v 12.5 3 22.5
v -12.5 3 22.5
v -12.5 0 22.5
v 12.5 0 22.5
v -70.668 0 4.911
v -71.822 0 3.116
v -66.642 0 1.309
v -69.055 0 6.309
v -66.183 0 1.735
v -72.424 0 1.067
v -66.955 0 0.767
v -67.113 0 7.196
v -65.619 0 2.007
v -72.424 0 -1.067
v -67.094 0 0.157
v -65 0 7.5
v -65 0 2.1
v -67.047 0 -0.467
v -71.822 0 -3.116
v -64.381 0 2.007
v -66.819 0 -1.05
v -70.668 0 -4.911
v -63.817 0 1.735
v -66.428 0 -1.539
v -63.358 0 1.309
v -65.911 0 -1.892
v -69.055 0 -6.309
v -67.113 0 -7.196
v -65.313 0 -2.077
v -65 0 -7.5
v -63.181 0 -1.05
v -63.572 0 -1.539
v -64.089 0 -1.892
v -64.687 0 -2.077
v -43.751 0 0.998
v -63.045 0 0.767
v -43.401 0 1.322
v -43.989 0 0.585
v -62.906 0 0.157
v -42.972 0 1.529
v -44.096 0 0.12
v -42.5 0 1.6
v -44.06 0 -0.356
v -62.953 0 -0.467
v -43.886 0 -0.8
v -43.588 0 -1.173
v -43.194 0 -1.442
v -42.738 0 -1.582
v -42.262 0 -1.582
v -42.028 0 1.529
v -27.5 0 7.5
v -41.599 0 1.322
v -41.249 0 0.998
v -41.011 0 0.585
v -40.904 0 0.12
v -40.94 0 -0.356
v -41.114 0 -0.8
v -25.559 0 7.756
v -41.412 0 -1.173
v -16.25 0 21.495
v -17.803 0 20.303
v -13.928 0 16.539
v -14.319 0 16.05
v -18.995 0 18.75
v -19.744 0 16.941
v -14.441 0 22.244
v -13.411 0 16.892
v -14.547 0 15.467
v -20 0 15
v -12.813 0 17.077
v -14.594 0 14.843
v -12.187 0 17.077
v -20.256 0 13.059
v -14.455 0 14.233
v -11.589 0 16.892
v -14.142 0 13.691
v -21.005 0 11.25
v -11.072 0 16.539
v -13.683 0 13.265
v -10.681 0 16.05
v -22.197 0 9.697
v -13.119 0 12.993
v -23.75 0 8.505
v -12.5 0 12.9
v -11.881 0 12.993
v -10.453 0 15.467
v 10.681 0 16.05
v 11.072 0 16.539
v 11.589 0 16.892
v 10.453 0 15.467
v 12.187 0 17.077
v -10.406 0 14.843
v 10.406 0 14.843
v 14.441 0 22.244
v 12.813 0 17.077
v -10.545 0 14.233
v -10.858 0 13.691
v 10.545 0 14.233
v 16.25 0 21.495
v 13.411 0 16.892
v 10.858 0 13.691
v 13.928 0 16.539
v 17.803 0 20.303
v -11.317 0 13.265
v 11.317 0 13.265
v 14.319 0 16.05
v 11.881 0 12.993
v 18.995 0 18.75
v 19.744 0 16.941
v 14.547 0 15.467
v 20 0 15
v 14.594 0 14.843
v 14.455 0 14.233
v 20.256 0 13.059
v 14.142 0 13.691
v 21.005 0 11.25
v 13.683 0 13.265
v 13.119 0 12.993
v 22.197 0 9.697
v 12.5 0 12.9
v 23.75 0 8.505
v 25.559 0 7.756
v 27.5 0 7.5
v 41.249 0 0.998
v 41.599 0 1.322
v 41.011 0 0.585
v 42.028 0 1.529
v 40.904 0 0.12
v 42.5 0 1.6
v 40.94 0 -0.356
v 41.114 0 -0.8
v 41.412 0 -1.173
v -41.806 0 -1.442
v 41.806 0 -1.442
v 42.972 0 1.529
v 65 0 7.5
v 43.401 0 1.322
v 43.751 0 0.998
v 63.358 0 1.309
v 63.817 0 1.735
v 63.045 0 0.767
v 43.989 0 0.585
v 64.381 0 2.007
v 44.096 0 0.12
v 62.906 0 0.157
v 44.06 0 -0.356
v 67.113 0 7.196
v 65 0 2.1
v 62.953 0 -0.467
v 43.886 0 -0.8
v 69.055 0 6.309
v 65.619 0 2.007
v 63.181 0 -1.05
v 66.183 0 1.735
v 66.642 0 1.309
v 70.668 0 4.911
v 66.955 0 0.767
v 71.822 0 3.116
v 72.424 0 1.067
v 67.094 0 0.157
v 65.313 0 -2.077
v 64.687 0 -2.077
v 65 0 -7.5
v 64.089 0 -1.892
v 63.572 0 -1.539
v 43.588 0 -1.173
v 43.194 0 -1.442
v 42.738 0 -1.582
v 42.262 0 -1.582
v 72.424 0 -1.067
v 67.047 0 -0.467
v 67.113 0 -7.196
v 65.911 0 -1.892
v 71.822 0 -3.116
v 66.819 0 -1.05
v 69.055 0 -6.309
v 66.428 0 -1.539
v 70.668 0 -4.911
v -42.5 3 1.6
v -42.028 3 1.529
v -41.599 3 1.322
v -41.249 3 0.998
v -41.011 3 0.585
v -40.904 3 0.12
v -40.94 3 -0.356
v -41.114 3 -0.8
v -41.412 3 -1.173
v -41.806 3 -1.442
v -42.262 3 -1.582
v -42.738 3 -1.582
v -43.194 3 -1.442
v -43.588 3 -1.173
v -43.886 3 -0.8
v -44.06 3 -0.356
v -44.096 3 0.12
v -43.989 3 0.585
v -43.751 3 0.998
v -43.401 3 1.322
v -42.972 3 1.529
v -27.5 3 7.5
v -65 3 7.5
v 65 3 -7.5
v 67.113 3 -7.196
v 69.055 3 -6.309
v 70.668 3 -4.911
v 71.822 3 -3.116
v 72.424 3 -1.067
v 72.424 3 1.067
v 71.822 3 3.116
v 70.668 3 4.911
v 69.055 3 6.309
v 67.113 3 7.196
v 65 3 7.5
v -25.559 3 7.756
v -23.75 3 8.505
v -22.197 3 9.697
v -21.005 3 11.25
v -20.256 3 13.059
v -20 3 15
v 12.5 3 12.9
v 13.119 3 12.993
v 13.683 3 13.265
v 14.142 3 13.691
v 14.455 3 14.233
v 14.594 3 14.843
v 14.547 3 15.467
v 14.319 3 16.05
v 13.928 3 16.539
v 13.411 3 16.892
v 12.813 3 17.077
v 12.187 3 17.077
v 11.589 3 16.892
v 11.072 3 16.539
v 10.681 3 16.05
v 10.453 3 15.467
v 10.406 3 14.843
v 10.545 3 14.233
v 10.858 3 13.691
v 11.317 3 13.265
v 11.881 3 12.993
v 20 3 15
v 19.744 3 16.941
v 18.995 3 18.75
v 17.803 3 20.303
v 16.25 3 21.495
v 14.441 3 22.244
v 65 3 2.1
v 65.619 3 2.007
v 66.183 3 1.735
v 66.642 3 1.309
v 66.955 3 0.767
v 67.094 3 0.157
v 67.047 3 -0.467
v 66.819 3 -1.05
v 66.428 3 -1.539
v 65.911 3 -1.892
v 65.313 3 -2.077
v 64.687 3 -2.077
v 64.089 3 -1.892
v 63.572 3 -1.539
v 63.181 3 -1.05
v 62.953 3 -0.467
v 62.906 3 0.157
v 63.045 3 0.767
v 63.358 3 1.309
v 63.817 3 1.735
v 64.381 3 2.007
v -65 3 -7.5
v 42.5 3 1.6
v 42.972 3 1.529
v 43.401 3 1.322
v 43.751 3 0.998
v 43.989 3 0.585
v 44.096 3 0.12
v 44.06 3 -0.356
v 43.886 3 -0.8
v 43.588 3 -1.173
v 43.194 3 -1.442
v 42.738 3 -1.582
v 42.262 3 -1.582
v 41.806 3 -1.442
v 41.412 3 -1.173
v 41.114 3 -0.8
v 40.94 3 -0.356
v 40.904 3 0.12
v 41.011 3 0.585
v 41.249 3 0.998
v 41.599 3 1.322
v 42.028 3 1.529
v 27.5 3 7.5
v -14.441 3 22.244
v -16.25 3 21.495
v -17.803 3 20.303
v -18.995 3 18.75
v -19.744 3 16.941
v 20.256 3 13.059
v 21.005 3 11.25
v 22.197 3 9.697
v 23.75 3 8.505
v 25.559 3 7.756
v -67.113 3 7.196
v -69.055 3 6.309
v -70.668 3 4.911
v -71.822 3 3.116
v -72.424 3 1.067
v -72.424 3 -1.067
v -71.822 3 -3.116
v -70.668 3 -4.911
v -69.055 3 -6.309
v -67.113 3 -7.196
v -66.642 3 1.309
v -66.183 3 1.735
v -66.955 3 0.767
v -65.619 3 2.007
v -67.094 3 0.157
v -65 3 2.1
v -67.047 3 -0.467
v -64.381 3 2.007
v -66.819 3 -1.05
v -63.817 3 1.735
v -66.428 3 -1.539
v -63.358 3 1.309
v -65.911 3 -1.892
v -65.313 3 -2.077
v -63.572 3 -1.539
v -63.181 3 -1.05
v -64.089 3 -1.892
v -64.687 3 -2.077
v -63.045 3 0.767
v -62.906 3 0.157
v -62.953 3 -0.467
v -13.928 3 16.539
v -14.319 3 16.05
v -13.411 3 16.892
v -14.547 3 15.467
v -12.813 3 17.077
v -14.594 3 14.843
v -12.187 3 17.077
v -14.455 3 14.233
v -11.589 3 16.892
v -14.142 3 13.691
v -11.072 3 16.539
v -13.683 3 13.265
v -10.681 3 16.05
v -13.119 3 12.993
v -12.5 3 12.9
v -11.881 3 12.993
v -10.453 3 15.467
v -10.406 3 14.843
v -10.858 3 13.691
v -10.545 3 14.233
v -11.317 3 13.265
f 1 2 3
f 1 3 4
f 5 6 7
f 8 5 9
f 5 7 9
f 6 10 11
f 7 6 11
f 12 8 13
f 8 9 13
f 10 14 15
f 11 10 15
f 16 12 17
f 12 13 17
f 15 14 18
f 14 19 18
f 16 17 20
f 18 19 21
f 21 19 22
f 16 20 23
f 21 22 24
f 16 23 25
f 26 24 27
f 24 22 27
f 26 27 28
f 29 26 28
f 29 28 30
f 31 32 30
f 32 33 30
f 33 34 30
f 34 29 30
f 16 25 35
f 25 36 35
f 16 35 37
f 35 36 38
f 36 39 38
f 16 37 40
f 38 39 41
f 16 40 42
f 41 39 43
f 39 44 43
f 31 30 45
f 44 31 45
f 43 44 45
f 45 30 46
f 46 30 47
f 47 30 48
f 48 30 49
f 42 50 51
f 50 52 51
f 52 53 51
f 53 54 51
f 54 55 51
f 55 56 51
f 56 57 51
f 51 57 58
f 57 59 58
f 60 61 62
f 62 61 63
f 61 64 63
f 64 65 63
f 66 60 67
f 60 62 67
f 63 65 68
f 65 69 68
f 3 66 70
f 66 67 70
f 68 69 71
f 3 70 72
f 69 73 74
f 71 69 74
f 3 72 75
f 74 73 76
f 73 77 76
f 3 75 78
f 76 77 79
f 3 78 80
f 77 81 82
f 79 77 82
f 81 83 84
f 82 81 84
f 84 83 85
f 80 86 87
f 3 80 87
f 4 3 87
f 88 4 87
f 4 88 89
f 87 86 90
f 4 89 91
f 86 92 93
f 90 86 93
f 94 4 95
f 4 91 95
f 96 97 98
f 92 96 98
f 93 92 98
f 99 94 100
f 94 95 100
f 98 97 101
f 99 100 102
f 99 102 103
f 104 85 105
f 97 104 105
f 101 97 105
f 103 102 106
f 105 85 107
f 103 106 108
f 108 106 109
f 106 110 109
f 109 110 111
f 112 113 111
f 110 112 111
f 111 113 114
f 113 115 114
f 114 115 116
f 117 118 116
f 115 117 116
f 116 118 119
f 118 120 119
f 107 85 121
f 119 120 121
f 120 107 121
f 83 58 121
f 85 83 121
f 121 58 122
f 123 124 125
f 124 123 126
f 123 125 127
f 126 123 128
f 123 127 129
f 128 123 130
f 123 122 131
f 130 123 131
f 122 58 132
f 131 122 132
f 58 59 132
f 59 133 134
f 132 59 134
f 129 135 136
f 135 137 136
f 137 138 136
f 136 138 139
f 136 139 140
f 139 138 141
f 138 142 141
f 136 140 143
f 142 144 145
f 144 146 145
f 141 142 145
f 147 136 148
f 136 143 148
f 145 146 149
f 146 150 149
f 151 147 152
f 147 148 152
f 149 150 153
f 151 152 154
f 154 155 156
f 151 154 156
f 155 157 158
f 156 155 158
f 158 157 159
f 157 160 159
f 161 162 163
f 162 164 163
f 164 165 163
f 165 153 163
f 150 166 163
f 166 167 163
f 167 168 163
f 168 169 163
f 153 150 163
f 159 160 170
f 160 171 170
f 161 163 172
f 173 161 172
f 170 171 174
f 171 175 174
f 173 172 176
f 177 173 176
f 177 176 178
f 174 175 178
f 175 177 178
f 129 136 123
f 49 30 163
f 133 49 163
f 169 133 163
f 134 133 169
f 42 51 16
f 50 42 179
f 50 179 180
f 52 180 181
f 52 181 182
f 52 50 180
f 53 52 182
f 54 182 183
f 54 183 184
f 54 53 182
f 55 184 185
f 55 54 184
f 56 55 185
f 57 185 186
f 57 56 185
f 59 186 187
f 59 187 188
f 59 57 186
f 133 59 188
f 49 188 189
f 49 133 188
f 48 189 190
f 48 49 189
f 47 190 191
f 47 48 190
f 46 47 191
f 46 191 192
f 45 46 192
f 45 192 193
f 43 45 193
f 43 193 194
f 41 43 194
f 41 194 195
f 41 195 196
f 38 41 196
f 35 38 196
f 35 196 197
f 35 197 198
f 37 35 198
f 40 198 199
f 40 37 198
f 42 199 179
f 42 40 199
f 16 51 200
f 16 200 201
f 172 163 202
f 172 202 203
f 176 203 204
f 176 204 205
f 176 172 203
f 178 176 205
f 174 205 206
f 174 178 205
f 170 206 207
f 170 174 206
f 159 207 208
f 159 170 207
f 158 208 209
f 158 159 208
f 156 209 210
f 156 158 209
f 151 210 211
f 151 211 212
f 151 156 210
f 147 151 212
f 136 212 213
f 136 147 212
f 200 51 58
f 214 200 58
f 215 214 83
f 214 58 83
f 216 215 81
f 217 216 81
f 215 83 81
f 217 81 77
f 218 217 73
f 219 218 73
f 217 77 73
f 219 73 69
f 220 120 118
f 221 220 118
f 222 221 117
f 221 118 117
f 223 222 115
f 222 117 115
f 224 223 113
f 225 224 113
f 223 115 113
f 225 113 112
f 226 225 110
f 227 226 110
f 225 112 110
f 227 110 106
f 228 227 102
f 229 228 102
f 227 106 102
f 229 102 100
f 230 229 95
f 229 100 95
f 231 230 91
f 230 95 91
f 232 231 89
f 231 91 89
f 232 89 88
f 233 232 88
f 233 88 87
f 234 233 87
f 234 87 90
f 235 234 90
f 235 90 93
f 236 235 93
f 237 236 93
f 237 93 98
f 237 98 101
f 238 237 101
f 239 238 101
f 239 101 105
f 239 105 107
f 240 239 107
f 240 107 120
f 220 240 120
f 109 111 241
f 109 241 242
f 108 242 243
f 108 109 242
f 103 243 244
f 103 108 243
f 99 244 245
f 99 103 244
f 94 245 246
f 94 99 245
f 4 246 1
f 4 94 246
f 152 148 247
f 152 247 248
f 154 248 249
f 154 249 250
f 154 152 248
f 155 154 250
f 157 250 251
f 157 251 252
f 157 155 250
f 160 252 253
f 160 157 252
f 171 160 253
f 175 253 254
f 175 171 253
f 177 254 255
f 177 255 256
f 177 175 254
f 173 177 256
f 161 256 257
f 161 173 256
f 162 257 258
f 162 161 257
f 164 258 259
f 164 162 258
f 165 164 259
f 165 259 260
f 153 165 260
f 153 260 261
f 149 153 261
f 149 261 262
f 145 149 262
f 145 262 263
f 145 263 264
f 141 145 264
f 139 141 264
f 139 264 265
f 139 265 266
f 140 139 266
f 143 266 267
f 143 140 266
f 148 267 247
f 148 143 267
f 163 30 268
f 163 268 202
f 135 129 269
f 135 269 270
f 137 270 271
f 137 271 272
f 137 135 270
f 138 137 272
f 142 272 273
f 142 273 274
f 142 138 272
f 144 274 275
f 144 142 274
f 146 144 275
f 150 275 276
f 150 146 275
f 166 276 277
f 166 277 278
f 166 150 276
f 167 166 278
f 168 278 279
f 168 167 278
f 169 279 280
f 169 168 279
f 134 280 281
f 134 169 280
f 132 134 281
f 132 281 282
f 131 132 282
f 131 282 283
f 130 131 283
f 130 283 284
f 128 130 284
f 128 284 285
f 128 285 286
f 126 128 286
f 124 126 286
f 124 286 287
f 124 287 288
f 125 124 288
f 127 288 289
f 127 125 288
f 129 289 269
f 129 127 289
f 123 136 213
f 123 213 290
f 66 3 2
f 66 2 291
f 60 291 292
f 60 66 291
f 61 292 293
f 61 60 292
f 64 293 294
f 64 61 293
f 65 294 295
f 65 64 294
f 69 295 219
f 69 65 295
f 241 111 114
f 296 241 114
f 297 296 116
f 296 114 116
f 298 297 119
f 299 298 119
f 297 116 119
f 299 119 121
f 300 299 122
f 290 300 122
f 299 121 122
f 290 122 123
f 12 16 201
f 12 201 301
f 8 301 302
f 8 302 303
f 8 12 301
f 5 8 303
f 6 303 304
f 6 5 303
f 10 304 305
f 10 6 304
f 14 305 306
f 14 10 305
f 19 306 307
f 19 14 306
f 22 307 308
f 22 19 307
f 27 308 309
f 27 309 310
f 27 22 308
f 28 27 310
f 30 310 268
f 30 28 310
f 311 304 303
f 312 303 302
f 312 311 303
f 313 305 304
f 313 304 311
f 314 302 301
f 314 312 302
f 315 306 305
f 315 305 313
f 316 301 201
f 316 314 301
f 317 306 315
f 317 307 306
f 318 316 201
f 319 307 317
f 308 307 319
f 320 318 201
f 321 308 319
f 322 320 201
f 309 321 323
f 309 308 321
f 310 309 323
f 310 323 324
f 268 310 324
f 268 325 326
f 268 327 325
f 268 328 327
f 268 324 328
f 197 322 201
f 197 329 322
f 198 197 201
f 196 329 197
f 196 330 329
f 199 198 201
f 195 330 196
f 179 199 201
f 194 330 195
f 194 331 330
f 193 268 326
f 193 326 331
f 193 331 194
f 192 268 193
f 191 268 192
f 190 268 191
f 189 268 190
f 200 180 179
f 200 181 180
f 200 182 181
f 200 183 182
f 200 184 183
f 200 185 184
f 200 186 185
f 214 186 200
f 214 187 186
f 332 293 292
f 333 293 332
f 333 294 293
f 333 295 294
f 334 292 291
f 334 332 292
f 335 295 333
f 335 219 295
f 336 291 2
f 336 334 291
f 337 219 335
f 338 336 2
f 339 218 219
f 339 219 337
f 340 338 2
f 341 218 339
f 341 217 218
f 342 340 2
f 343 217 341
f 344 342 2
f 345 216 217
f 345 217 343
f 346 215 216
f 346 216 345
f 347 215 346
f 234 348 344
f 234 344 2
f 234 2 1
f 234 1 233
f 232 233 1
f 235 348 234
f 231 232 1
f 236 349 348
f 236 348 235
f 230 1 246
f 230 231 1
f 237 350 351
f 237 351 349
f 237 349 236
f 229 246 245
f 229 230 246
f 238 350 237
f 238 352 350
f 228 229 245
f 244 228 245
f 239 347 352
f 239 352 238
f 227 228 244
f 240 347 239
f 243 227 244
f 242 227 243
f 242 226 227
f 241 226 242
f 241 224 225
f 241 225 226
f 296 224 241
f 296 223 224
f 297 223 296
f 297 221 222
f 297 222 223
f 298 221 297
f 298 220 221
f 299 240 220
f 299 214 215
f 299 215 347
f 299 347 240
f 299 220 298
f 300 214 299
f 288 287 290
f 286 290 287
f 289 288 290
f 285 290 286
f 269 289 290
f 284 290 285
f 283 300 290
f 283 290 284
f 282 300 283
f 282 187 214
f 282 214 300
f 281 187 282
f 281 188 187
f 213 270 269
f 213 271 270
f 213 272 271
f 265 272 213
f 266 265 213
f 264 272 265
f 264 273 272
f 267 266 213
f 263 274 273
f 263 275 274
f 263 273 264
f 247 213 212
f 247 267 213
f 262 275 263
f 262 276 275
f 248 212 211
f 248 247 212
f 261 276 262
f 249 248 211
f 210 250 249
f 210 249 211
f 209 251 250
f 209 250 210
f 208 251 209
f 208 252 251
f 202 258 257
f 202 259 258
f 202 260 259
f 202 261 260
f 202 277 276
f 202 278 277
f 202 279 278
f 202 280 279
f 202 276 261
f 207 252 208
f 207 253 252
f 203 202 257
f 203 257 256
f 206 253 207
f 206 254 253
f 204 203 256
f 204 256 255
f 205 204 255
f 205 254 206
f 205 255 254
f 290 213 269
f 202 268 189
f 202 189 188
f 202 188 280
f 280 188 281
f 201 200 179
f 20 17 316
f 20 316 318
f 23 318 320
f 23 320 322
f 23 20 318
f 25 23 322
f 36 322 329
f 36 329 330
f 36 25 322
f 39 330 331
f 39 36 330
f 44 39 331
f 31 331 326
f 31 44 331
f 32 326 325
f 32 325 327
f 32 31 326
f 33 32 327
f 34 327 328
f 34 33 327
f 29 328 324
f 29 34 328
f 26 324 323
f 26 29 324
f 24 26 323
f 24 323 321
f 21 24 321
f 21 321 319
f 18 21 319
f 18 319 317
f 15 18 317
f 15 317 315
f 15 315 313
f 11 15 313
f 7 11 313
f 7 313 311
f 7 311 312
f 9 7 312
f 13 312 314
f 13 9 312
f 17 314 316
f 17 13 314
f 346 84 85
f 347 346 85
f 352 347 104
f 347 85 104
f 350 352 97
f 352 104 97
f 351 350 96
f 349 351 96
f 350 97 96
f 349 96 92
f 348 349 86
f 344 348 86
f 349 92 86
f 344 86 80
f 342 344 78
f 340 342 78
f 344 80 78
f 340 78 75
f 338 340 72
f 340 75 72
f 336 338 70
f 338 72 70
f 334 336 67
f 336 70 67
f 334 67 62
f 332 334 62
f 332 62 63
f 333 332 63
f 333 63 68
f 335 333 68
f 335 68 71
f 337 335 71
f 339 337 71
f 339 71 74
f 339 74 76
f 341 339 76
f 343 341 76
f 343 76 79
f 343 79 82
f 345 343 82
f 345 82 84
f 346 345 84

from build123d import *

# Parameters (mm, degrees)
SKETCH_1_R          = 1.6
SKETCH_1_R_2        = 2.1
EXTRUDE_1_DEPTH     = 3
SKETCH_3_W          = 40
SKETCH_3_H          = 3
EXTRUDE_3_DEPTH     = 15
SKETCH_2_R          = 2.1
CUT_EXTRUDE_1_DEPTH = 76.970388968
FILLET_START        = -1
FILLET_2_DEPTH      = 5
FILLET_2_2_DEPTH    = 3


with BuildPart() as part:
    # 草图1 → 凸台-拉伸1 (new body)
    with BuildSketch(Plane(origin=(0, 0, 0), x_dir=(1, 0, 0), z_dir=(0, 1, 0))):
        with BuildLine():
            Line((-65, 7.5), (65, 7.5))
            ThreePointArc((65, 7.5), (72.5, 0), (65, -7.5))
            Line((65, -7.5), (-65, -7.5))
            ThreePointArc((-65, -7.5), (-72.5, 0), (-65, 7.5))
        make_face()
        with Locations(Location((-42.5, 0, 0), (0, 0, 270))):
            Circle(SKETCH_1_R, mode=Mode.SUBTRACT)
        with Locations(Location((-65, 0, 0), (0, 0, 270))):
            Circle(SKETCH_1_R_2, mode=Mode.SUBTRACT)
        with Locations(Location((65, 0, 0), (0, 0, 270))):
            Circle(SKETCH_1_R_2, mode=Mode.SUBTRACT)
        with Locations(Location((42.5, 0, 0), (0, 0, 270))):
            Circle(SKETCH_1_R, mode=Mode.SUBTRACT)
    extrude(amount=EXTRUDE_1_DEPTH)

    # 草图3 → 凸台-拉伸3 (add)
    with BuildSketch(Plane.XY.offset(7.5)):
        with Locations((0, 1.5)):
            Rectangle(SKETCH_3_W, SKETCH_3_H)
    extrude(amount=EXTRUDE_3_DEPTH)

    # 草图2 → 切除-拉伸1 (cut, through all)
    with BuildSketch(Plane.XZ):
        with Locations(Location((-12.5, 15, 0), (0, 0, 270))):
            Circle(SKETCH_2_R)
        with Locations(Location((12.5, 15, 0), (0, 0, 270))):
            Circle(SKETCH_2_R)
    extrude(amount=-CUT_EXTRUDE_1_DEPTH, mode=Mode.SUBTRACT)

    # 圆角2: read off the stored shape, not the designer's step
    # 圆角2 outline → 圆角2 (cut)
    with BuildSketch(Plane(origin=(0, 0, 0), x_dir=(1, 0, 0), z_dir=(0, 1, 0)).offset(FILLET_START)):
        with BuildLine():
            ThreePointArc((20, -15), (17.803300859, -20.303300859), (12.5, -22.5))
            Line((12.5, -22.5), (20, -22.5))
            Line((20, -22.5), (20, -15))
        make_face()
        with BuildLine():
            Line((-20, -22.5), (-12.5, -22.5))
            ThreePointArc((-12.5, -22.5), (-17.803300859, -20.303300859), (-20, -15))
            Line((-20, -15), (-20, -22.5))
        make_face()
    extrude(amount=FILLET_2_DEPTH, mode=Mode.SUBTRACT)

    # Fillet 2 2 outline → Fillet 2 2 (add)
    with BuildSketch(Plane(origin=(0, 0, 0), x_dir=(1, 0, 0), z_dir=(0, 1, 0))):
        with BuildLine():
            Line((20, -7.5), (20, -15))
            ThreePointArc((20, -15), (22.196699141, -9.696699141), (27.5, -7.5))
            Line((27.5, -7.5), (20, -7.5))
        make_face()
        with BuildLine():
            ThreePointArc((-27.5, -7.5), (-22.196699141, -9.696699141), (-20, -15))
            Line((-20, -15), (-20, -7.5))
            Line((-20, -7.5), (-27.5, -7.5))
        make_face()
    extrude(amount=FILLET_2_2_DEPTH)


solid = part.part
